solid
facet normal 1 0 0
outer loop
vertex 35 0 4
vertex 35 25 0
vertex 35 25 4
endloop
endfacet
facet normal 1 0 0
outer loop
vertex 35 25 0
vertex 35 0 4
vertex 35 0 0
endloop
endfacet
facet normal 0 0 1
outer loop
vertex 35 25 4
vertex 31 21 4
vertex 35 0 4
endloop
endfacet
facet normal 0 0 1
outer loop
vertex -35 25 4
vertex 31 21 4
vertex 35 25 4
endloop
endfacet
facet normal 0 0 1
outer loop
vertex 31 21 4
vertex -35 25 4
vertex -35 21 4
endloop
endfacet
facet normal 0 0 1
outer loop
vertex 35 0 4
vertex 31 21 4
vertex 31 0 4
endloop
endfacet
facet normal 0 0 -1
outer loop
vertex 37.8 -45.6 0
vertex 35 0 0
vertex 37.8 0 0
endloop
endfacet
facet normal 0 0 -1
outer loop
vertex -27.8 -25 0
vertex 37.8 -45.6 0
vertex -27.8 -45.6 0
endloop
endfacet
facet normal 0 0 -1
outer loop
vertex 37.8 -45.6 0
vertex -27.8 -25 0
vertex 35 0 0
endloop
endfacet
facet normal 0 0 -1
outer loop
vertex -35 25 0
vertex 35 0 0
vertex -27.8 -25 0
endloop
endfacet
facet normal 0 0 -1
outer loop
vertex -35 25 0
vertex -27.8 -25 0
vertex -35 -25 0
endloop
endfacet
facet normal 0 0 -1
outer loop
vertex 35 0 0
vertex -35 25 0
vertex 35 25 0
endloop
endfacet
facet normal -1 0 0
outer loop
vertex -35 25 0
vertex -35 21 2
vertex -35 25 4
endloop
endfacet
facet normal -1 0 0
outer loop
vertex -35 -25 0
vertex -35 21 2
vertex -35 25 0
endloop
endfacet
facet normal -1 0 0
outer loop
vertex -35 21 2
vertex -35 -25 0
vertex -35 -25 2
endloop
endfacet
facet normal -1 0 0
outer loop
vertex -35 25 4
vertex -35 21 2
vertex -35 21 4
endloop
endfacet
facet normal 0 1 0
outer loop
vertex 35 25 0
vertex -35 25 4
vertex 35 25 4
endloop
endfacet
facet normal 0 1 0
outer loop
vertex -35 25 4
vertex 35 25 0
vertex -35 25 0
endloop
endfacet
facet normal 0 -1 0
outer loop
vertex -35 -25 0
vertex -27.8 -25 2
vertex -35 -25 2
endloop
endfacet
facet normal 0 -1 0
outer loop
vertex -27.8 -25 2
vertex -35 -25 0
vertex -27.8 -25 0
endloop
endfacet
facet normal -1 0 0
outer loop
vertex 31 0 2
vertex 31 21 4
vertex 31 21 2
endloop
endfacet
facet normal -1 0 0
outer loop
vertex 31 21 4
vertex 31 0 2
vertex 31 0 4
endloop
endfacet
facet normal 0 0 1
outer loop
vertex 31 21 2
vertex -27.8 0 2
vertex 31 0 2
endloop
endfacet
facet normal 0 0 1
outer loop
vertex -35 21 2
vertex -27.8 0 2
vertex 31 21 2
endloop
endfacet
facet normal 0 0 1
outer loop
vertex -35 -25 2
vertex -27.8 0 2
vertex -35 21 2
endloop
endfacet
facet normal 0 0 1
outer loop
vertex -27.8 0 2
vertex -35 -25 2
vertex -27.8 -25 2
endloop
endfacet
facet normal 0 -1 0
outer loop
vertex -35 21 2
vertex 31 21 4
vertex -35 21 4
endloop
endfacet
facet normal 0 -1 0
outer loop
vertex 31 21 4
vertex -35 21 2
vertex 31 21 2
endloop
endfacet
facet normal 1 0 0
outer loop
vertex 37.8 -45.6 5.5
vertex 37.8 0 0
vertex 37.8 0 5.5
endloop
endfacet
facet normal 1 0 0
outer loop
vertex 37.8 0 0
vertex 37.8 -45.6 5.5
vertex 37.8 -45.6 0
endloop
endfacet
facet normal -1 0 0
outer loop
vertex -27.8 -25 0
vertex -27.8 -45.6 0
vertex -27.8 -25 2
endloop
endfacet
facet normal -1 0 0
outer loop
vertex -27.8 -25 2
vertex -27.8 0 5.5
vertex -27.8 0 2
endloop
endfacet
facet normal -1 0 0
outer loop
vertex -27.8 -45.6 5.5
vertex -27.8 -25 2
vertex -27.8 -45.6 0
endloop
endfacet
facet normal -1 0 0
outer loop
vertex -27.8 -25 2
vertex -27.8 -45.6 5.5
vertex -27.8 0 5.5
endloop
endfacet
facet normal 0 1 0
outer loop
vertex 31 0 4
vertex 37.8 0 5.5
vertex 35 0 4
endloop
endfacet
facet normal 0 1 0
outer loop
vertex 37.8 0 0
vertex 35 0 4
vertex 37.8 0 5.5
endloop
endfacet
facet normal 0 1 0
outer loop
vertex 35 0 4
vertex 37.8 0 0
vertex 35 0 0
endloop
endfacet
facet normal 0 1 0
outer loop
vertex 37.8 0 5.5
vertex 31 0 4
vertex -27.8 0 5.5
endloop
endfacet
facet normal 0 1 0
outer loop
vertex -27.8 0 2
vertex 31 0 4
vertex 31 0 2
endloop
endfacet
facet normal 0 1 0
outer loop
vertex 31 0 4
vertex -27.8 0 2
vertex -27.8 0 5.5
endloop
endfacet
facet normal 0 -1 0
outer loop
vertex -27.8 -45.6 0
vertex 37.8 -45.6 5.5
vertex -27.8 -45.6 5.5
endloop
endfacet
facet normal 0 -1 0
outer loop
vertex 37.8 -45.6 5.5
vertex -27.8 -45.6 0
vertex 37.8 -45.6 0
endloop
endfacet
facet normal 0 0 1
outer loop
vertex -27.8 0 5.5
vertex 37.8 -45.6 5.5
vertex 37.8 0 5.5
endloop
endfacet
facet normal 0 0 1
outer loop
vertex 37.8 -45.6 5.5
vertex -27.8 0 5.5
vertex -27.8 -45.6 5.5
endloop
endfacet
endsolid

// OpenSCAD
// Two-part enclosure for a small electronics board (e.g., Arduino-based temperature logger)
// Print orientation: both parts rest on the bed (z = 0), side by side, with a 10 mm gap.
// The lid is printed upside down: a flat plate with a rectangular lip on top that slides into
// the open-top box. The user specified the lid's outer size (65.6 x 45.6 mm), so that is
// used for the lip; the resulting clearance is about 0.2 mm on each side.

// ---------------- Parameters ----------------
box_x      = 70;    // box outer length (X)
box_y      = 50;    // box outer width (Y)
box_z      = 30;    // box outer height (Z)
wall       = 2;     // box wall thickness
floor      = 2;     // box floor thickness

lip_t      = 1.5;   // lid lip thickness (the wall on top of the plate)
lip_h      = 4;     // lid lip height (wall height above the plate)
lip_x      = 65.6;  // lid lip outer length (X)
lip_y      = 45.6;  // lid lip outer width (Y)

eps        = 0.5;   // cutter overshoot past faces
gap        = 10;    // horizontal gap between the two parts

$fn = 64;

// ---------------- Model ----------------
union() {
    // Part 1: open-top box
    translate([-box_x/2, -box_y/2, 0])
        difference() {
            cube([box_x, box_y, floor + wall]);   // floor + side walls
            translate([0, 0, floor])
                cube([box_x - 2*wall, box_y - 2*wall, wall + eps]);   // open top
        }

    // Part 2: lid (printed upside down: plate, then lip on top)
    translate([gap - gap/2, -lip_y/2, 0])
        union() {
            // base plate
            translate([-lip_x/2, -lip_y/2, 0])
                cube([lip_x, lip_y, lip_t]);
            // rectangular lip (wall), centred on the plate
            translate([-lip_x/2, -lip_y/2, lip_t])
                cube([lip_x, lip_y, lip_h]);
        }
}
